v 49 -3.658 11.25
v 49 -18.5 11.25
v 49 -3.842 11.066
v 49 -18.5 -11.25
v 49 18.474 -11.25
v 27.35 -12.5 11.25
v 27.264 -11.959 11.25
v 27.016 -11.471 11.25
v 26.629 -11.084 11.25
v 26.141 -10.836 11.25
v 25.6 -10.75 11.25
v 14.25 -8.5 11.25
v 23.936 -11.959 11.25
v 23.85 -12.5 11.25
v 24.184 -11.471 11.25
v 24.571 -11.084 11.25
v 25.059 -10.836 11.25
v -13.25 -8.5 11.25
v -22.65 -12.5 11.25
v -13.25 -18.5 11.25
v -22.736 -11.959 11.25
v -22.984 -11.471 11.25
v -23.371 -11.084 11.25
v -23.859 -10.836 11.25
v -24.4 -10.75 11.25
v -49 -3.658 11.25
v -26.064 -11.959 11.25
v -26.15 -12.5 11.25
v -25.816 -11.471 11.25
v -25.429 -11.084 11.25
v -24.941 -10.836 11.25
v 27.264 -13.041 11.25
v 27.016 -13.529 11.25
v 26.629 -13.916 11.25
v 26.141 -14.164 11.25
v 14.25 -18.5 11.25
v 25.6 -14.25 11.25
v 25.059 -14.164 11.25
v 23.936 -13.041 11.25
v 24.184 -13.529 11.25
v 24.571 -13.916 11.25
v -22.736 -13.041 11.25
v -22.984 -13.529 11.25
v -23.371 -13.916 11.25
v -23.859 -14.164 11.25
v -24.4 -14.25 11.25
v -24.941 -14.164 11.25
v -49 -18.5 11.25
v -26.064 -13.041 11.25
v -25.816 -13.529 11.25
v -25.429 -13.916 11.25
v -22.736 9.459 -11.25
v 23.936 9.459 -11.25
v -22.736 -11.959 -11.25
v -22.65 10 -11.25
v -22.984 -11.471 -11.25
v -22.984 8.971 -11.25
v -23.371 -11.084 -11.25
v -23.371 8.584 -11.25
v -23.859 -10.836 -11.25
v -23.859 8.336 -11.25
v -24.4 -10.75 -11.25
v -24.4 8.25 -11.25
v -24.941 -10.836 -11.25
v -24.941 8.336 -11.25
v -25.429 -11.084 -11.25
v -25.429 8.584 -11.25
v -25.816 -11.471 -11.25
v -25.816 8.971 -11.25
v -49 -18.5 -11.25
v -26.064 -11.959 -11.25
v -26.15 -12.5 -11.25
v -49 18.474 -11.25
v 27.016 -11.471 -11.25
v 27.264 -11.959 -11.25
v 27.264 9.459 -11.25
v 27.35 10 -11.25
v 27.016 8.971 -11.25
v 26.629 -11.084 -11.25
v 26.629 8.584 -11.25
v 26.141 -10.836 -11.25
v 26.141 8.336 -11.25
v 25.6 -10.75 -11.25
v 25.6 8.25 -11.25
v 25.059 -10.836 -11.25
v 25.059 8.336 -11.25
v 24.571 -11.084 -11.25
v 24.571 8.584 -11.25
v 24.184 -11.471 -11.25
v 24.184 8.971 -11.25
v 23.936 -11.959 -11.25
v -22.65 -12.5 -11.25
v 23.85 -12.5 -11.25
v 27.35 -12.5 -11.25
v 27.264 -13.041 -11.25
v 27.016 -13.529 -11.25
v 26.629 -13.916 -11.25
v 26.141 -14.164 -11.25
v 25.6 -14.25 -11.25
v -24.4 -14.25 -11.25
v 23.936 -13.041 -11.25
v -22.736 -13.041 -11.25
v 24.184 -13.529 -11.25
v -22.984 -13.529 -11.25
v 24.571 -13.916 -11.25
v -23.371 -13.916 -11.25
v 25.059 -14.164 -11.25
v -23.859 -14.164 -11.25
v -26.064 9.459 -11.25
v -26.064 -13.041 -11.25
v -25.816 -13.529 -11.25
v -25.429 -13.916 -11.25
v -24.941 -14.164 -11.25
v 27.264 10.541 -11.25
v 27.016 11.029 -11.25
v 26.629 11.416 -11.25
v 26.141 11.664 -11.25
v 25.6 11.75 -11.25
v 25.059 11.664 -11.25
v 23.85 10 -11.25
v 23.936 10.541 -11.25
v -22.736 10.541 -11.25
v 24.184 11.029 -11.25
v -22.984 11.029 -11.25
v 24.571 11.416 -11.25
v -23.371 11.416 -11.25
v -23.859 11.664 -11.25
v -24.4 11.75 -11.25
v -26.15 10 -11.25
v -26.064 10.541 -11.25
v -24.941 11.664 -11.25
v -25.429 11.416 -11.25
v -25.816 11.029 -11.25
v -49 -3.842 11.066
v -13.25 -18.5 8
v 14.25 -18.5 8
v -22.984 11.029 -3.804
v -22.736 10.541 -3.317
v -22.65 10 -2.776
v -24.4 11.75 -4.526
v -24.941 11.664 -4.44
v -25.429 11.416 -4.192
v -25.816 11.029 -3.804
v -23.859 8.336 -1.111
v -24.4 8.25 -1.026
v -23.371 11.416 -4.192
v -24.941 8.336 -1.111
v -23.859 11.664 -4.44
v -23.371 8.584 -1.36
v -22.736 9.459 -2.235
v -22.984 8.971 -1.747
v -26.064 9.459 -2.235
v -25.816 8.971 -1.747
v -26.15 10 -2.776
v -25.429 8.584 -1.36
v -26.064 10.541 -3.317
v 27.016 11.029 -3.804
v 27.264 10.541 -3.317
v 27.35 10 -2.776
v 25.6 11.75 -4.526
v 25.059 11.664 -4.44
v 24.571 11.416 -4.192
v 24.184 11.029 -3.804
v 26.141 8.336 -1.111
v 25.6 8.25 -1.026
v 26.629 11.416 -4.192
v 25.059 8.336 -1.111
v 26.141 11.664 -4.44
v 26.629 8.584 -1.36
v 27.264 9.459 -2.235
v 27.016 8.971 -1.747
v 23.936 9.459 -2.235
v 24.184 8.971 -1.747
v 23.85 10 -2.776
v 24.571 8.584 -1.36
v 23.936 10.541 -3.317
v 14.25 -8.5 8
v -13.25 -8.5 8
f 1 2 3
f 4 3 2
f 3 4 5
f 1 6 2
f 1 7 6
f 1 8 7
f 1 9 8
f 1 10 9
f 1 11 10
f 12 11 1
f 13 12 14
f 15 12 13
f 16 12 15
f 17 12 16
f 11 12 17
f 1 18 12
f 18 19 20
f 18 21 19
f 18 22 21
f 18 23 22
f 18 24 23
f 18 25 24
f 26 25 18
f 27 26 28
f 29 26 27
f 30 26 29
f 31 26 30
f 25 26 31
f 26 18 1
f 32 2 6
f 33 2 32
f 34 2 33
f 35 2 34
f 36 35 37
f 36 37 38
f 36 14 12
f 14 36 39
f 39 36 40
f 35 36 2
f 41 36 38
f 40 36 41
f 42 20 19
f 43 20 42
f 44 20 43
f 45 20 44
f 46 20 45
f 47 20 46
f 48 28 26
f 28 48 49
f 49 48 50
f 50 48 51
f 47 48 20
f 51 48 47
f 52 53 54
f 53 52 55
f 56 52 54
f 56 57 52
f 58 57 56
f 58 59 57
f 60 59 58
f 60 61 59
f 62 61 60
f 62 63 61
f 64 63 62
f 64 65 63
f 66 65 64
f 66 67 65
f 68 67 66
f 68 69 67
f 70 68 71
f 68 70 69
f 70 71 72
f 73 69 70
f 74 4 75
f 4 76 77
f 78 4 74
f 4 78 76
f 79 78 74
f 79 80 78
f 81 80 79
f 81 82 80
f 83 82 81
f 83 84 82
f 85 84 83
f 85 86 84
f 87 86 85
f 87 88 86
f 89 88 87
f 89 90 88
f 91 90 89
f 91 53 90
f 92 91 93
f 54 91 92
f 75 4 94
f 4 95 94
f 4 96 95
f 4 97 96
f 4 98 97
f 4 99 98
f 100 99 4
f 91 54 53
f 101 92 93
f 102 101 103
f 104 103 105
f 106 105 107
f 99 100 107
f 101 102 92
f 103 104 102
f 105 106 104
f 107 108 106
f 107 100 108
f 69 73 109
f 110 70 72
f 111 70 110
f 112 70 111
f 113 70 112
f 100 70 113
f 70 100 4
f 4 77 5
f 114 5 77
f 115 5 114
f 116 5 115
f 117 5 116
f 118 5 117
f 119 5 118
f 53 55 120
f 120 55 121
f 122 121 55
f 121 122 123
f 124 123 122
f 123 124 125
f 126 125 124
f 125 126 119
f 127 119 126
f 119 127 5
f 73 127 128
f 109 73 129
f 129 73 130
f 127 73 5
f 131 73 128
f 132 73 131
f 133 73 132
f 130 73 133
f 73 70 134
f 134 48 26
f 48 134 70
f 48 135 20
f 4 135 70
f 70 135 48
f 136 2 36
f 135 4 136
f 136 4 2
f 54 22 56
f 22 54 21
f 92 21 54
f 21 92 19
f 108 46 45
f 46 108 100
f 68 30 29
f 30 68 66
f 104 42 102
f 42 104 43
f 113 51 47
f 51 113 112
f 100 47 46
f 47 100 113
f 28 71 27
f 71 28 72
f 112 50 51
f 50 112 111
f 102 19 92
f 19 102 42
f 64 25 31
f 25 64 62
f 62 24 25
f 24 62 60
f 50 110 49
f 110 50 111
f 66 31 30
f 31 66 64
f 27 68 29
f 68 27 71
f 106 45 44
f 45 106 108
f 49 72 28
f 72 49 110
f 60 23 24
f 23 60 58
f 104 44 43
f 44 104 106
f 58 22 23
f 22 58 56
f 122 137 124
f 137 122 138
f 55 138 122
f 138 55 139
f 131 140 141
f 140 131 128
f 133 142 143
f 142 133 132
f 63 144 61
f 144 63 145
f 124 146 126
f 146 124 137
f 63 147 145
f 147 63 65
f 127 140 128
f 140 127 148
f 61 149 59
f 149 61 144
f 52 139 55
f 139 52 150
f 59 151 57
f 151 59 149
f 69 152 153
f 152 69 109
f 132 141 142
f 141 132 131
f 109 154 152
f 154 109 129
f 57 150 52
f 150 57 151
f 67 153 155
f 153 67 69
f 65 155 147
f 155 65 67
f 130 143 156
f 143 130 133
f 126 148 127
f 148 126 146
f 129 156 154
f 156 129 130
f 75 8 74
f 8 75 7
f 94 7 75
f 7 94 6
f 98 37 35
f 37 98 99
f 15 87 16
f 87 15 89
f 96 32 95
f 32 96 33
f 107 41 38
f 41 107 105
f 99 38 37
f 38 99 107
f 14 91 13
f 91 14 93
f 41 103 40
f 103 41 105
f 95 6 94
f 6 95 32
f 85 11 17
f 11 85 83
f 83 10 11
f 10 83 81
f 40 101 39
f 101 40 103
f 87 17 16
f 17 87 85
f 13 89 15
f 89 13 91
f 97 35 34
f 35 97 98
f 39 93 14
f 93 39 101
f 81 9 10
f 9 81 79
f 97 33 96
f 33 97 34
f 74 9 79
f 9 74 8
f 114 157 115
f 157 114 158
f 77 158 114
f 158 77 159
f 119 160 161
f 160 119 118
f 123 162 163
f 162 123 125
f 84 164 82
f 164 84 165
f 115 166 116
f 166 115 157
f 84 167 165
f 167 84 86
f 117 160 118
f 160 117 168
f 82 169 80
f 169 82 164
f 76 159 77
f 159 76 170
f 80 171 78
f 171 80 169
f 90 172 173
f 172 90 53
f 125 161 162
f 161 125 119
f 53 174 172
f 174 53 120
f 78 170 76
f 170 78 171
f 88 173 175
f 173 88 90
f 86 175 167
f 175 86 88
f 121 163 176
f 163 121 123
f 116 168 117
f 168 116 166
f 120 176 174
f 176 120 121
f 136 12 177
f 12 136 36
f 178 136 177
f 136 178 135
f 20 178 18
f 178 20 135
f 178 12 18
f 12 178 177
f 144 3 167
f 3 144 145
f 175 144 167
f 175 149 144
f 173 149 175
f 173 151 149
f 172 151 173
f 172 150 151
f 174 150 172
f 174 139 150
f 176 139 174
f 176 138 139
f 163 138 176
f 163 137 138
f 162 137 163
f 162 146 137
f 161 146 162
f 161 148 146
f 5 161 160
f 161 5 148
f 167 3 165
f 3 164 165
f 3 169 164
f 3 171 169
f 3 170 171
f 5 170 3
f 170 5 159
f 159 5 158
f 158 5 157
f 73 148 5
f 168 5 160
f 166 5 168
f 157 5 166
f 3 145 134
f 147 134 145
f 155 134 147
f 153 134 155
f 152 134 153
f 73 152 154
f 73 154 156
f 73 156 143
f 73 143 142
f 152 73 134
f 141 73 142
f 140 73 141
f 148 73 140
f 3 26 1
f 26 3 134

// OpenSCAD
// file: BOSL2/std.scad
// Minimal BOSL2 compatibility shim for bundled gallery models.
// It implements only the helpers used by the imported OpenSCAD projects.

CENTER = [0, 0, 0];
BOTTOM = [0, 0, -1];
TOP = [0, 0, 1];
LEFT = [-1, 0, 0];
RIGHT = [1, 0, 0];
FRONT = [0, -1, 0];
BACK = [0, 1, 0];

module up(z=0) {
    translate([0, 0, z]) children();
}

module down(z=0) {
    translate([0, 0, -z]) children();
}

module attach(anchor=CENTER) {
    children();
}

module cuboid(size=[1, 1, 1], anchor=CENTER) {
    center = anchor == CENTER;
    translate(center ? [0, 0, 0] : [0, 0, size[2] / 2])
        cube(size, center=true);
    children();
}

module xcyl(h=1, r=1, anchor=CENTER) {
    center = anchor == CENTER;
    translate(center ? [0, 0, 0] : [h / 2, 0, 0])
        rotate([0, 90, 0])
            cylinder(h=h, r=r, center=true);
}
// file: BOSL2/joiners.scad
// Minimal dovetail approximation for bundled gallery models.

module dovetail(type="male", slide=10, width=10, height=4, back_width=12, spin=0) {
    profile = type == "female"
        ? [[-back_width / 2, -height / 2], [back_width / 2, -height / 2], [width / 2, height / 2], [-width / 2, height / 2]]
        : [[-width / 2, -height / 2], [width / 2, -height / 2], [back_width / 2, height / 2], [-back_width / 2, height / 2]];

    rotate([0, 0, spin])
        linear_extrude(height=slide, center=true)
            polygon(profile);
}
// main file
include <BOSL2/joiners.scad>
include <BOSL2/std.scad>
include <Round-Anything/polyround.scad>

tol = 0.05;
height = 45;
bridge_size = [ 84, 35, height ];
border_size = [ 14, 2, 6 ];

module spring_cutout()
{
    cube([ 27.5, 11, 25 ], center = true);
}
module screw_holes()
{
    // Screw Holes
    translate([ -24.4, -11.5, 25 / 2 + 1 ]) cylinder(h = 100, d = 3.5, center = true, $fn = 20);
    translate([ -24.4, 11, 25 / 2 + 1 ]) cylinder(h = 100, d = 3.5, center = true, $fn = 20);
    translate([ 25.6, -11.5, 25 / 2 + 1 ]) cylinder(h = 100, d = 3.5, center = true, $fn = 20);
    translate([ 25.6, 11, 25 / 2 + 1 ]) cylinder(h = 100, d = 3.5, center = true, $fn = 20);
}

module bridge_mount(cut, tol, height)
{
    // Cutout for Dovetail (lower half towards body)
    translate([ 0, bridge_size.y / 4 + 10, bridge_size.z / 7.5 - border_size.z ]) rotate([ -45, 0, 0 ]) cuboid(
        [
            bridge_size.x + border_size.x + 5, bridge_size.x / 2.5 + border_size.x,
            cut == true ? bridge_size.z / 3 + 1 : bridge_size.z / 3 + 1.3
        ],
        rounding = 2, $fn = 20);
}

module floyd_rose(cut, tol, bridge_size = bridge_size, border_size = border_size)
{
    {
        difference()
        {
            // Bottom Half
            cuboid([ bridge_size.x + border_size.x, bridge_size.y + border_size.y, bridge_size.z / 2 ])
            {
                attach(TOP, BOTTOM)
                {
                    translate([ 0, -1, 0 ])
                        // Bridge Mounting Area
                        cuboid([ bridge_size.x, bridge_size.y, bridge_size.z / 2 - border_size.z ], rounding = 2,
                               $fn = 32, edges = [ BACK + LEFT, BACK + RIGHT ]);

                    difference() // Edge around Bridge Mounting Area
                    {
                        translate([ 0, 0, 0 ]) cuboid(
                            [ bridge_size.x + border_size.x, bridge_size.y + border_size.y, bridge_size.z / 2 ]); // top
                        if (!cut == true)
                            translate([ 0, -2.5, 0 ]) cuboid(
                                [ bridge_size.x, bridge_size.y + border_size.y, bridge_size.z / 2 + bridge_size.z ],
                                rounding = 2, $fn = 32,
                                edges = [ BACK + LEFT, BACK + RIGHT ]); // cutout plate for rest of the height
                    }
                }
            }
            // Cutout for Dovetail (lower half towards body)
            bridge_mount(cut, tol, height);
            // rotate([0,-10,0])
            //  #dovetail(cut == true ? "male" : " female",
            //           h = bridge_size.x / 4,
            //           width = bridge_size.z / 2.5,
            //           angle = -30,
            //           //taper = 1,
            //           slide = 110,
            //           round = true,
            //           radius = 1);
            // #cuboid([ bridge_size.x + border_size.x + 1, 12, bridge_size.z - bridge_size.z / 1.5 ], rounding = 2,
            // edges = [FRONT+TOP, FRONT+BOTTOM], $fn=20); cube([ bridge_size.x + border_size.x + 1, 12, bridge_size.z -
            // bridge_size.z / 2 ],
            //      center = true); // cutout for dovetail
            if (!cut == true)
            {
                translate([ 0, -1, 0 ]) screw_holes();
                translate([ 0.5, -bridge_size.y / 2 + 3.5, bridge_size.z / 2 - 2 ]) spring_cutout();
            }
        }
        // difference()
        // {
        //     //translate([ 0, 6.2, 2 ]) rotate([ 0, cut == true ? -90 : 90, 90 ])
        //         //br_dovetail(cut = cut, bridge_size = bridge_size, border_size = border_size, tol = tol);
        //     if (!cut == true)
        //         translate([ 0, -1, 0 ]) screw_holes();
        // }
    }
}

module br_dovetail(cut = false, tol = tol, bridge_size = bridge_size, border_size = border_size)
{
    dovetail(cut == true ? "female" : "male", w = cut == true ? 15 : 15 - 0.4, h = cut == true ? 10.2 : 10.2 - 0.2,
             slide = bridge_size.x + border_size.x, $slop = tol, radius = 0.25, round = true, $fn = 32);
}

difference()
{
    floyd_rose(cut = false, tol = 0.05);
    // translate([0,-12,0])
    // cube([100,30,40], center=true);
    // translate([0,0,25])
    // cube([100,40,15], center=true);
    // br_dovetail();
}
